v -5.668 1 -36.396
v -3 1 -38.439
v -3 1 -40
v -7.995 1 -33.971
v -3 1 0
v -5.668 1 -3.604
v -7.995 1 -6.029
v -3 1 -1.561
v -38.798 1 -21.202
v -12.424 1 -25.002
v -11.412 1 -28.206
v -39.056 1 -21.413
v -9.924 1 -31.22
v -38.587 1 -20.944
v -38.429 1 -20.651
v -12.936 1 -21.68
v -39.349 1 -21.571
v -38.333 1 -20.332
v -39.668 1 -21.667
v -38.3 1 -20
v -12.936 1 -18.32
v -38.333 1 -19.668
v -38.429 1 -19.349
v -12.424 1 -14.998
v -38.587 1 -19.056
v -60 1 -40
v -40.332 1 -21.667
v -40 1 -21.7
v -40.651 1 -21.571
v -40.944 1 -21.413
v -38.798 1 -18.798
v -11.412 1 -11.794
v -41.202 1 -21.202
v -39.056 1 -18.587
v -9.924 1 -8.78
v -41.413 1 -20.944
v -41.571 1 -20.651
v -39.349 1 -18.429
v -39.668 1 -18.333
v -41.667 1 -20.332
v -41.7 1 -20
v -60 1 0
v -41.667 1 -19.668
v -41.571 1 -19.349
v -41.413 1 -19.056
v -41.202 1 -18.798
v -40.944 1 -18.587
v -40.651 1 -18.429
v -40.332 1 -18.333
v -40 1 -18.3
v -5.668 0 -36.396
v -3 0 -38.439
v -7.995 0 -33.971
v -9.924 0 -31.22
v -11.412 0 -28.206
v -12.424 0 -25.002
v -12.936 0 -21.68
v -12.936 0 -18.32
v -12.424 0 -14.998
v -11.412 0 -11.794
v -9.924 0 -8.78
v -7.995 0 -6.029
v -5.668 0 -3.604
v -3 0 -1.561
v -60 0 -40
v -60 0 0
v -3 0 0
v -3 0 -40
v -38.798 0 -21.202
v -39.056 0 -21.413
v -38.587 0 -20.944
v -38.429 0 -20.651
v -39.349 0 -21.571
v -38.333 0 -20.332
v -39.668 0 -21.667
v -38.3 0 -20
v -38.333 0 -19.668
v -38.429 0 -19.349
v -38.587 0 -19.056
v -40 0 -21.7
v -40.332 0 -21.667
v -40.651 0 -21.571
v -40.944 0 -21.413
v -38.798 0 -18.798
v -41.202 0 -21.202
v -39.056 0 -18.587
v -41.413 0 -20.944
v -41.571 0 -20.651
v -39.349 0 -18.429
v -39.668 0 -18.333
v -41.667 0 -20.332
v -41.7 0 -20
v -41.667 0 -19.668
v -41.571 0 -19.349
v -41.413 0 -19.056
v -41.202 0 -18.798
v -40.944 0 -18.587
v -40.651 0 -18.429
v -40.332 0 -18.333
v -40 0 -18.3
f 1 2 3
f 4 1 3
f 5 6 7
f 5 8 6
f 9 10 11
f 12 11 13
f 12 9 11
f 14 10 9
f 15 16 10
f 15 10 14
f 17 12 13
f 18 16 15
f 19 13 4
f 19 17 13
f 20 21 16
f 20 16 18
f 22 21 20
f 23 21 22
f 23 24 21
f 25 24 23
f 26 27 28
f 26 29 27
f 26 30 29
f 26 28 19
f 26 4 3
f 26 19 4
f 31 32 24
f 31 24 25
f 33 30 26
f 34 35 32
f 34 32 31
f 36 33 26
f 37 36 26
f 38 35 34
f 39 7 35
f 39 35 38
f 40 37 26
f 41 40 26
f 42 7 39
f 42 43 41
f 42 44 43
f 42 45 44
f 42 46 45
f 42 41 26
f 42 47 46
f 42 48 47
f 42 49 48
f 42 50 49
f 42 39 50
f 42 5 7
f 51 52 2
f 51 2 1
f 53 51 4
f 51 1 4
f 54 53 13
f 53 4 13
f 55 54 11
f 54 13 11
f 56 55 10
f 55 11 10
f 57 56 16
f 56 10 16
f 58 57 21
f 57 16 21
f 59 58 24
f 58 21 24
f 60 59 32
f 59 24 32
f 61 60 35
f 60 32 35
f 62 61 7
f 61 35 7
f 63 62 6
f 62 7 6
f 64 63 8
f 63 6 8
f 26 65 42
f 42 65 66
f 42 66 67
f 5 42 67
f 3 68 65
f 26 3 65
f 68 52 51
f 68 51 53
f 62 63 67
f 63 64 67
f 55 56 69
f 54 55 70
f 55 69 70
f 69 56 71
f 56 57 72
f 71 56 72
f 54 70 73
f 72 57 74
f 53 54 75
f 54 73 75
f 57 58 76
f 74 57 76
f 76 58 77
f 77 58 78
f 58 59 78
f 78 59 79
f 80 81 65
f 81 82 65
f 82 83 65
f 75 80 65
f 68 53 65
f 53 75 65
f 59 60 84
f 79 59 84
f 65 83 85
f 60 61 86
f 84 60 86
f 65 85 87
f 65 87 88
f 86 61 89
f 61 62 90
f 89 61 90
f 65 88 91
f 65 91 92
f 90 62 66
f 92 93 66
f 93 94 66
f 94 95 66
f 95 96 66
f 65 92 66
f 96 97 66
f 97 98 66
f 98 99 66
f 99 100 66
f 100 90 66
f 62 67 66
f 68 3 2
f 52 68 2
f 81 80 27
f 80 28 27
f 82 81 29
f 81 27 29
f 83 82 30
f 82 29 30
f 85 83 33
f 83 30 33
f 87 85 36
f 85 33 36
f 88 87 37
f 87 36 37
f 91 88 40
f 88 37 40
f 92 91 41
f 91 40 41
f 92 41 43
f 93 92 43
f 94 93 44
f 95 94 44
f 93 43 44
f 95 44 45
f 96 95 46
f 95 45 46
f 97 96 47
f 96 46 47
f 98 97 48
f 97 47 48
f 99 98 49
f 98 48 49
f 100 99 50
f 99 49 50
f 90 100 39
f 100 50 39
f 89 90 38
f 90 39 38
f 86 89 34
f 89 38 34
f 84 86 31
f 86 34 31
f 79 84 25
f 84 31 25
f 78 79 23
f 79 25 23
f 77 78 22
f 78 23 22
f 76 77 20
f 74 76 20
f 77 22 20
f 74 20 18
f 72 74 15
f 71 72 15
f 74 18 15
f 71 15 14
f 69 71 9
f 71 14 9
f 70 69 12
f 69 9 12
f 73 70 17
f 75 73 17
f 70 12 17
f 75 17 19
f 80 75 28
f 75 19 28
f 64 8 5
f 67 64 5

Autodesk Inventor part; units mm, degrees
ref_plane "YZ Plane" through (0, 0, 0) normal (1, 0, 0) x (0, 1, 0)
ref_plane "XZ Plane" through (0, 0, 0) normal (0, 1, 0) x (-1, 0, 0)
ref_plane "XY Plane" through (0, 0, 0) normal (0, 0, 1) x (1, 0, 0)
sketch "Boceto1" plane through (0, 0, 0) normal (0, 1, 0) x (-1, 0, 0)
  line L0 (0, 0) -> (0, -40)
  line L1 (0, -40) -> (60, -40)
  line L2 (60, 0) -> (0, 0)
  line L3 (60, -40) -> (60, 0)
  dimension "d1" = 60
  dimension "d3" = 40
extrude "Extrusión1" add sketch "Boceto1" along normal blind 1
sketch "Boceto2" plane through (0, 0, 0) normal (0, -1, 0) x (1, 0, 0)
  line L0 (0, 0) -> (0, -40) projected
  circle A0 centre (9, -20) radius 22
  point P0 (0, -20)
  dimension "d7" = 44
  dimension "d8" = 9
extrude "Extrusión2" cut sketch "Boceto2" against normal through all
sketch "Boceto3" plane through (0, 1, 0) normal (0, 1, 0) x (1, 0, 0)
  arc A0 (-0.1652, 40) -> (-0.1652, 0) centre (9, 20) ccw projected
  line L0 (-0.1652, 40) -> (-60, 40) projected
  line L1 (-60, 40) -> (-60, 0) projected
  line L2 (-60, 0) -> (-0.1652, 0) projected
  line L3 (-60, 40) -> (-3, 40)
  line L4 (-3, 40) -> (-3, 0)
  line L5 (-3, 0) -> (-60, 0)
  line L6 (-60, 0) -> (-60, 40)
  point P0 (0, 0)
  point P1 (-3, 38.4391)
  point P2 (-3, 1.5609)
  dimension "d11" = 57
extrude "Extrusión3" cut sketch "Boceto3" against normal through all contours A0 L4 L2 L1 L0 keep common part
sketch "Boceto4" plane through (0, 0, 0) normal (0, -1, 0) x (1, 0, 0)
  point P0 (-40, -20)
hole "Agujero1" at (-40, 0, -20) direction (0, 1, 0) diameter 3.4 end through all
properties part number "platina_1"
